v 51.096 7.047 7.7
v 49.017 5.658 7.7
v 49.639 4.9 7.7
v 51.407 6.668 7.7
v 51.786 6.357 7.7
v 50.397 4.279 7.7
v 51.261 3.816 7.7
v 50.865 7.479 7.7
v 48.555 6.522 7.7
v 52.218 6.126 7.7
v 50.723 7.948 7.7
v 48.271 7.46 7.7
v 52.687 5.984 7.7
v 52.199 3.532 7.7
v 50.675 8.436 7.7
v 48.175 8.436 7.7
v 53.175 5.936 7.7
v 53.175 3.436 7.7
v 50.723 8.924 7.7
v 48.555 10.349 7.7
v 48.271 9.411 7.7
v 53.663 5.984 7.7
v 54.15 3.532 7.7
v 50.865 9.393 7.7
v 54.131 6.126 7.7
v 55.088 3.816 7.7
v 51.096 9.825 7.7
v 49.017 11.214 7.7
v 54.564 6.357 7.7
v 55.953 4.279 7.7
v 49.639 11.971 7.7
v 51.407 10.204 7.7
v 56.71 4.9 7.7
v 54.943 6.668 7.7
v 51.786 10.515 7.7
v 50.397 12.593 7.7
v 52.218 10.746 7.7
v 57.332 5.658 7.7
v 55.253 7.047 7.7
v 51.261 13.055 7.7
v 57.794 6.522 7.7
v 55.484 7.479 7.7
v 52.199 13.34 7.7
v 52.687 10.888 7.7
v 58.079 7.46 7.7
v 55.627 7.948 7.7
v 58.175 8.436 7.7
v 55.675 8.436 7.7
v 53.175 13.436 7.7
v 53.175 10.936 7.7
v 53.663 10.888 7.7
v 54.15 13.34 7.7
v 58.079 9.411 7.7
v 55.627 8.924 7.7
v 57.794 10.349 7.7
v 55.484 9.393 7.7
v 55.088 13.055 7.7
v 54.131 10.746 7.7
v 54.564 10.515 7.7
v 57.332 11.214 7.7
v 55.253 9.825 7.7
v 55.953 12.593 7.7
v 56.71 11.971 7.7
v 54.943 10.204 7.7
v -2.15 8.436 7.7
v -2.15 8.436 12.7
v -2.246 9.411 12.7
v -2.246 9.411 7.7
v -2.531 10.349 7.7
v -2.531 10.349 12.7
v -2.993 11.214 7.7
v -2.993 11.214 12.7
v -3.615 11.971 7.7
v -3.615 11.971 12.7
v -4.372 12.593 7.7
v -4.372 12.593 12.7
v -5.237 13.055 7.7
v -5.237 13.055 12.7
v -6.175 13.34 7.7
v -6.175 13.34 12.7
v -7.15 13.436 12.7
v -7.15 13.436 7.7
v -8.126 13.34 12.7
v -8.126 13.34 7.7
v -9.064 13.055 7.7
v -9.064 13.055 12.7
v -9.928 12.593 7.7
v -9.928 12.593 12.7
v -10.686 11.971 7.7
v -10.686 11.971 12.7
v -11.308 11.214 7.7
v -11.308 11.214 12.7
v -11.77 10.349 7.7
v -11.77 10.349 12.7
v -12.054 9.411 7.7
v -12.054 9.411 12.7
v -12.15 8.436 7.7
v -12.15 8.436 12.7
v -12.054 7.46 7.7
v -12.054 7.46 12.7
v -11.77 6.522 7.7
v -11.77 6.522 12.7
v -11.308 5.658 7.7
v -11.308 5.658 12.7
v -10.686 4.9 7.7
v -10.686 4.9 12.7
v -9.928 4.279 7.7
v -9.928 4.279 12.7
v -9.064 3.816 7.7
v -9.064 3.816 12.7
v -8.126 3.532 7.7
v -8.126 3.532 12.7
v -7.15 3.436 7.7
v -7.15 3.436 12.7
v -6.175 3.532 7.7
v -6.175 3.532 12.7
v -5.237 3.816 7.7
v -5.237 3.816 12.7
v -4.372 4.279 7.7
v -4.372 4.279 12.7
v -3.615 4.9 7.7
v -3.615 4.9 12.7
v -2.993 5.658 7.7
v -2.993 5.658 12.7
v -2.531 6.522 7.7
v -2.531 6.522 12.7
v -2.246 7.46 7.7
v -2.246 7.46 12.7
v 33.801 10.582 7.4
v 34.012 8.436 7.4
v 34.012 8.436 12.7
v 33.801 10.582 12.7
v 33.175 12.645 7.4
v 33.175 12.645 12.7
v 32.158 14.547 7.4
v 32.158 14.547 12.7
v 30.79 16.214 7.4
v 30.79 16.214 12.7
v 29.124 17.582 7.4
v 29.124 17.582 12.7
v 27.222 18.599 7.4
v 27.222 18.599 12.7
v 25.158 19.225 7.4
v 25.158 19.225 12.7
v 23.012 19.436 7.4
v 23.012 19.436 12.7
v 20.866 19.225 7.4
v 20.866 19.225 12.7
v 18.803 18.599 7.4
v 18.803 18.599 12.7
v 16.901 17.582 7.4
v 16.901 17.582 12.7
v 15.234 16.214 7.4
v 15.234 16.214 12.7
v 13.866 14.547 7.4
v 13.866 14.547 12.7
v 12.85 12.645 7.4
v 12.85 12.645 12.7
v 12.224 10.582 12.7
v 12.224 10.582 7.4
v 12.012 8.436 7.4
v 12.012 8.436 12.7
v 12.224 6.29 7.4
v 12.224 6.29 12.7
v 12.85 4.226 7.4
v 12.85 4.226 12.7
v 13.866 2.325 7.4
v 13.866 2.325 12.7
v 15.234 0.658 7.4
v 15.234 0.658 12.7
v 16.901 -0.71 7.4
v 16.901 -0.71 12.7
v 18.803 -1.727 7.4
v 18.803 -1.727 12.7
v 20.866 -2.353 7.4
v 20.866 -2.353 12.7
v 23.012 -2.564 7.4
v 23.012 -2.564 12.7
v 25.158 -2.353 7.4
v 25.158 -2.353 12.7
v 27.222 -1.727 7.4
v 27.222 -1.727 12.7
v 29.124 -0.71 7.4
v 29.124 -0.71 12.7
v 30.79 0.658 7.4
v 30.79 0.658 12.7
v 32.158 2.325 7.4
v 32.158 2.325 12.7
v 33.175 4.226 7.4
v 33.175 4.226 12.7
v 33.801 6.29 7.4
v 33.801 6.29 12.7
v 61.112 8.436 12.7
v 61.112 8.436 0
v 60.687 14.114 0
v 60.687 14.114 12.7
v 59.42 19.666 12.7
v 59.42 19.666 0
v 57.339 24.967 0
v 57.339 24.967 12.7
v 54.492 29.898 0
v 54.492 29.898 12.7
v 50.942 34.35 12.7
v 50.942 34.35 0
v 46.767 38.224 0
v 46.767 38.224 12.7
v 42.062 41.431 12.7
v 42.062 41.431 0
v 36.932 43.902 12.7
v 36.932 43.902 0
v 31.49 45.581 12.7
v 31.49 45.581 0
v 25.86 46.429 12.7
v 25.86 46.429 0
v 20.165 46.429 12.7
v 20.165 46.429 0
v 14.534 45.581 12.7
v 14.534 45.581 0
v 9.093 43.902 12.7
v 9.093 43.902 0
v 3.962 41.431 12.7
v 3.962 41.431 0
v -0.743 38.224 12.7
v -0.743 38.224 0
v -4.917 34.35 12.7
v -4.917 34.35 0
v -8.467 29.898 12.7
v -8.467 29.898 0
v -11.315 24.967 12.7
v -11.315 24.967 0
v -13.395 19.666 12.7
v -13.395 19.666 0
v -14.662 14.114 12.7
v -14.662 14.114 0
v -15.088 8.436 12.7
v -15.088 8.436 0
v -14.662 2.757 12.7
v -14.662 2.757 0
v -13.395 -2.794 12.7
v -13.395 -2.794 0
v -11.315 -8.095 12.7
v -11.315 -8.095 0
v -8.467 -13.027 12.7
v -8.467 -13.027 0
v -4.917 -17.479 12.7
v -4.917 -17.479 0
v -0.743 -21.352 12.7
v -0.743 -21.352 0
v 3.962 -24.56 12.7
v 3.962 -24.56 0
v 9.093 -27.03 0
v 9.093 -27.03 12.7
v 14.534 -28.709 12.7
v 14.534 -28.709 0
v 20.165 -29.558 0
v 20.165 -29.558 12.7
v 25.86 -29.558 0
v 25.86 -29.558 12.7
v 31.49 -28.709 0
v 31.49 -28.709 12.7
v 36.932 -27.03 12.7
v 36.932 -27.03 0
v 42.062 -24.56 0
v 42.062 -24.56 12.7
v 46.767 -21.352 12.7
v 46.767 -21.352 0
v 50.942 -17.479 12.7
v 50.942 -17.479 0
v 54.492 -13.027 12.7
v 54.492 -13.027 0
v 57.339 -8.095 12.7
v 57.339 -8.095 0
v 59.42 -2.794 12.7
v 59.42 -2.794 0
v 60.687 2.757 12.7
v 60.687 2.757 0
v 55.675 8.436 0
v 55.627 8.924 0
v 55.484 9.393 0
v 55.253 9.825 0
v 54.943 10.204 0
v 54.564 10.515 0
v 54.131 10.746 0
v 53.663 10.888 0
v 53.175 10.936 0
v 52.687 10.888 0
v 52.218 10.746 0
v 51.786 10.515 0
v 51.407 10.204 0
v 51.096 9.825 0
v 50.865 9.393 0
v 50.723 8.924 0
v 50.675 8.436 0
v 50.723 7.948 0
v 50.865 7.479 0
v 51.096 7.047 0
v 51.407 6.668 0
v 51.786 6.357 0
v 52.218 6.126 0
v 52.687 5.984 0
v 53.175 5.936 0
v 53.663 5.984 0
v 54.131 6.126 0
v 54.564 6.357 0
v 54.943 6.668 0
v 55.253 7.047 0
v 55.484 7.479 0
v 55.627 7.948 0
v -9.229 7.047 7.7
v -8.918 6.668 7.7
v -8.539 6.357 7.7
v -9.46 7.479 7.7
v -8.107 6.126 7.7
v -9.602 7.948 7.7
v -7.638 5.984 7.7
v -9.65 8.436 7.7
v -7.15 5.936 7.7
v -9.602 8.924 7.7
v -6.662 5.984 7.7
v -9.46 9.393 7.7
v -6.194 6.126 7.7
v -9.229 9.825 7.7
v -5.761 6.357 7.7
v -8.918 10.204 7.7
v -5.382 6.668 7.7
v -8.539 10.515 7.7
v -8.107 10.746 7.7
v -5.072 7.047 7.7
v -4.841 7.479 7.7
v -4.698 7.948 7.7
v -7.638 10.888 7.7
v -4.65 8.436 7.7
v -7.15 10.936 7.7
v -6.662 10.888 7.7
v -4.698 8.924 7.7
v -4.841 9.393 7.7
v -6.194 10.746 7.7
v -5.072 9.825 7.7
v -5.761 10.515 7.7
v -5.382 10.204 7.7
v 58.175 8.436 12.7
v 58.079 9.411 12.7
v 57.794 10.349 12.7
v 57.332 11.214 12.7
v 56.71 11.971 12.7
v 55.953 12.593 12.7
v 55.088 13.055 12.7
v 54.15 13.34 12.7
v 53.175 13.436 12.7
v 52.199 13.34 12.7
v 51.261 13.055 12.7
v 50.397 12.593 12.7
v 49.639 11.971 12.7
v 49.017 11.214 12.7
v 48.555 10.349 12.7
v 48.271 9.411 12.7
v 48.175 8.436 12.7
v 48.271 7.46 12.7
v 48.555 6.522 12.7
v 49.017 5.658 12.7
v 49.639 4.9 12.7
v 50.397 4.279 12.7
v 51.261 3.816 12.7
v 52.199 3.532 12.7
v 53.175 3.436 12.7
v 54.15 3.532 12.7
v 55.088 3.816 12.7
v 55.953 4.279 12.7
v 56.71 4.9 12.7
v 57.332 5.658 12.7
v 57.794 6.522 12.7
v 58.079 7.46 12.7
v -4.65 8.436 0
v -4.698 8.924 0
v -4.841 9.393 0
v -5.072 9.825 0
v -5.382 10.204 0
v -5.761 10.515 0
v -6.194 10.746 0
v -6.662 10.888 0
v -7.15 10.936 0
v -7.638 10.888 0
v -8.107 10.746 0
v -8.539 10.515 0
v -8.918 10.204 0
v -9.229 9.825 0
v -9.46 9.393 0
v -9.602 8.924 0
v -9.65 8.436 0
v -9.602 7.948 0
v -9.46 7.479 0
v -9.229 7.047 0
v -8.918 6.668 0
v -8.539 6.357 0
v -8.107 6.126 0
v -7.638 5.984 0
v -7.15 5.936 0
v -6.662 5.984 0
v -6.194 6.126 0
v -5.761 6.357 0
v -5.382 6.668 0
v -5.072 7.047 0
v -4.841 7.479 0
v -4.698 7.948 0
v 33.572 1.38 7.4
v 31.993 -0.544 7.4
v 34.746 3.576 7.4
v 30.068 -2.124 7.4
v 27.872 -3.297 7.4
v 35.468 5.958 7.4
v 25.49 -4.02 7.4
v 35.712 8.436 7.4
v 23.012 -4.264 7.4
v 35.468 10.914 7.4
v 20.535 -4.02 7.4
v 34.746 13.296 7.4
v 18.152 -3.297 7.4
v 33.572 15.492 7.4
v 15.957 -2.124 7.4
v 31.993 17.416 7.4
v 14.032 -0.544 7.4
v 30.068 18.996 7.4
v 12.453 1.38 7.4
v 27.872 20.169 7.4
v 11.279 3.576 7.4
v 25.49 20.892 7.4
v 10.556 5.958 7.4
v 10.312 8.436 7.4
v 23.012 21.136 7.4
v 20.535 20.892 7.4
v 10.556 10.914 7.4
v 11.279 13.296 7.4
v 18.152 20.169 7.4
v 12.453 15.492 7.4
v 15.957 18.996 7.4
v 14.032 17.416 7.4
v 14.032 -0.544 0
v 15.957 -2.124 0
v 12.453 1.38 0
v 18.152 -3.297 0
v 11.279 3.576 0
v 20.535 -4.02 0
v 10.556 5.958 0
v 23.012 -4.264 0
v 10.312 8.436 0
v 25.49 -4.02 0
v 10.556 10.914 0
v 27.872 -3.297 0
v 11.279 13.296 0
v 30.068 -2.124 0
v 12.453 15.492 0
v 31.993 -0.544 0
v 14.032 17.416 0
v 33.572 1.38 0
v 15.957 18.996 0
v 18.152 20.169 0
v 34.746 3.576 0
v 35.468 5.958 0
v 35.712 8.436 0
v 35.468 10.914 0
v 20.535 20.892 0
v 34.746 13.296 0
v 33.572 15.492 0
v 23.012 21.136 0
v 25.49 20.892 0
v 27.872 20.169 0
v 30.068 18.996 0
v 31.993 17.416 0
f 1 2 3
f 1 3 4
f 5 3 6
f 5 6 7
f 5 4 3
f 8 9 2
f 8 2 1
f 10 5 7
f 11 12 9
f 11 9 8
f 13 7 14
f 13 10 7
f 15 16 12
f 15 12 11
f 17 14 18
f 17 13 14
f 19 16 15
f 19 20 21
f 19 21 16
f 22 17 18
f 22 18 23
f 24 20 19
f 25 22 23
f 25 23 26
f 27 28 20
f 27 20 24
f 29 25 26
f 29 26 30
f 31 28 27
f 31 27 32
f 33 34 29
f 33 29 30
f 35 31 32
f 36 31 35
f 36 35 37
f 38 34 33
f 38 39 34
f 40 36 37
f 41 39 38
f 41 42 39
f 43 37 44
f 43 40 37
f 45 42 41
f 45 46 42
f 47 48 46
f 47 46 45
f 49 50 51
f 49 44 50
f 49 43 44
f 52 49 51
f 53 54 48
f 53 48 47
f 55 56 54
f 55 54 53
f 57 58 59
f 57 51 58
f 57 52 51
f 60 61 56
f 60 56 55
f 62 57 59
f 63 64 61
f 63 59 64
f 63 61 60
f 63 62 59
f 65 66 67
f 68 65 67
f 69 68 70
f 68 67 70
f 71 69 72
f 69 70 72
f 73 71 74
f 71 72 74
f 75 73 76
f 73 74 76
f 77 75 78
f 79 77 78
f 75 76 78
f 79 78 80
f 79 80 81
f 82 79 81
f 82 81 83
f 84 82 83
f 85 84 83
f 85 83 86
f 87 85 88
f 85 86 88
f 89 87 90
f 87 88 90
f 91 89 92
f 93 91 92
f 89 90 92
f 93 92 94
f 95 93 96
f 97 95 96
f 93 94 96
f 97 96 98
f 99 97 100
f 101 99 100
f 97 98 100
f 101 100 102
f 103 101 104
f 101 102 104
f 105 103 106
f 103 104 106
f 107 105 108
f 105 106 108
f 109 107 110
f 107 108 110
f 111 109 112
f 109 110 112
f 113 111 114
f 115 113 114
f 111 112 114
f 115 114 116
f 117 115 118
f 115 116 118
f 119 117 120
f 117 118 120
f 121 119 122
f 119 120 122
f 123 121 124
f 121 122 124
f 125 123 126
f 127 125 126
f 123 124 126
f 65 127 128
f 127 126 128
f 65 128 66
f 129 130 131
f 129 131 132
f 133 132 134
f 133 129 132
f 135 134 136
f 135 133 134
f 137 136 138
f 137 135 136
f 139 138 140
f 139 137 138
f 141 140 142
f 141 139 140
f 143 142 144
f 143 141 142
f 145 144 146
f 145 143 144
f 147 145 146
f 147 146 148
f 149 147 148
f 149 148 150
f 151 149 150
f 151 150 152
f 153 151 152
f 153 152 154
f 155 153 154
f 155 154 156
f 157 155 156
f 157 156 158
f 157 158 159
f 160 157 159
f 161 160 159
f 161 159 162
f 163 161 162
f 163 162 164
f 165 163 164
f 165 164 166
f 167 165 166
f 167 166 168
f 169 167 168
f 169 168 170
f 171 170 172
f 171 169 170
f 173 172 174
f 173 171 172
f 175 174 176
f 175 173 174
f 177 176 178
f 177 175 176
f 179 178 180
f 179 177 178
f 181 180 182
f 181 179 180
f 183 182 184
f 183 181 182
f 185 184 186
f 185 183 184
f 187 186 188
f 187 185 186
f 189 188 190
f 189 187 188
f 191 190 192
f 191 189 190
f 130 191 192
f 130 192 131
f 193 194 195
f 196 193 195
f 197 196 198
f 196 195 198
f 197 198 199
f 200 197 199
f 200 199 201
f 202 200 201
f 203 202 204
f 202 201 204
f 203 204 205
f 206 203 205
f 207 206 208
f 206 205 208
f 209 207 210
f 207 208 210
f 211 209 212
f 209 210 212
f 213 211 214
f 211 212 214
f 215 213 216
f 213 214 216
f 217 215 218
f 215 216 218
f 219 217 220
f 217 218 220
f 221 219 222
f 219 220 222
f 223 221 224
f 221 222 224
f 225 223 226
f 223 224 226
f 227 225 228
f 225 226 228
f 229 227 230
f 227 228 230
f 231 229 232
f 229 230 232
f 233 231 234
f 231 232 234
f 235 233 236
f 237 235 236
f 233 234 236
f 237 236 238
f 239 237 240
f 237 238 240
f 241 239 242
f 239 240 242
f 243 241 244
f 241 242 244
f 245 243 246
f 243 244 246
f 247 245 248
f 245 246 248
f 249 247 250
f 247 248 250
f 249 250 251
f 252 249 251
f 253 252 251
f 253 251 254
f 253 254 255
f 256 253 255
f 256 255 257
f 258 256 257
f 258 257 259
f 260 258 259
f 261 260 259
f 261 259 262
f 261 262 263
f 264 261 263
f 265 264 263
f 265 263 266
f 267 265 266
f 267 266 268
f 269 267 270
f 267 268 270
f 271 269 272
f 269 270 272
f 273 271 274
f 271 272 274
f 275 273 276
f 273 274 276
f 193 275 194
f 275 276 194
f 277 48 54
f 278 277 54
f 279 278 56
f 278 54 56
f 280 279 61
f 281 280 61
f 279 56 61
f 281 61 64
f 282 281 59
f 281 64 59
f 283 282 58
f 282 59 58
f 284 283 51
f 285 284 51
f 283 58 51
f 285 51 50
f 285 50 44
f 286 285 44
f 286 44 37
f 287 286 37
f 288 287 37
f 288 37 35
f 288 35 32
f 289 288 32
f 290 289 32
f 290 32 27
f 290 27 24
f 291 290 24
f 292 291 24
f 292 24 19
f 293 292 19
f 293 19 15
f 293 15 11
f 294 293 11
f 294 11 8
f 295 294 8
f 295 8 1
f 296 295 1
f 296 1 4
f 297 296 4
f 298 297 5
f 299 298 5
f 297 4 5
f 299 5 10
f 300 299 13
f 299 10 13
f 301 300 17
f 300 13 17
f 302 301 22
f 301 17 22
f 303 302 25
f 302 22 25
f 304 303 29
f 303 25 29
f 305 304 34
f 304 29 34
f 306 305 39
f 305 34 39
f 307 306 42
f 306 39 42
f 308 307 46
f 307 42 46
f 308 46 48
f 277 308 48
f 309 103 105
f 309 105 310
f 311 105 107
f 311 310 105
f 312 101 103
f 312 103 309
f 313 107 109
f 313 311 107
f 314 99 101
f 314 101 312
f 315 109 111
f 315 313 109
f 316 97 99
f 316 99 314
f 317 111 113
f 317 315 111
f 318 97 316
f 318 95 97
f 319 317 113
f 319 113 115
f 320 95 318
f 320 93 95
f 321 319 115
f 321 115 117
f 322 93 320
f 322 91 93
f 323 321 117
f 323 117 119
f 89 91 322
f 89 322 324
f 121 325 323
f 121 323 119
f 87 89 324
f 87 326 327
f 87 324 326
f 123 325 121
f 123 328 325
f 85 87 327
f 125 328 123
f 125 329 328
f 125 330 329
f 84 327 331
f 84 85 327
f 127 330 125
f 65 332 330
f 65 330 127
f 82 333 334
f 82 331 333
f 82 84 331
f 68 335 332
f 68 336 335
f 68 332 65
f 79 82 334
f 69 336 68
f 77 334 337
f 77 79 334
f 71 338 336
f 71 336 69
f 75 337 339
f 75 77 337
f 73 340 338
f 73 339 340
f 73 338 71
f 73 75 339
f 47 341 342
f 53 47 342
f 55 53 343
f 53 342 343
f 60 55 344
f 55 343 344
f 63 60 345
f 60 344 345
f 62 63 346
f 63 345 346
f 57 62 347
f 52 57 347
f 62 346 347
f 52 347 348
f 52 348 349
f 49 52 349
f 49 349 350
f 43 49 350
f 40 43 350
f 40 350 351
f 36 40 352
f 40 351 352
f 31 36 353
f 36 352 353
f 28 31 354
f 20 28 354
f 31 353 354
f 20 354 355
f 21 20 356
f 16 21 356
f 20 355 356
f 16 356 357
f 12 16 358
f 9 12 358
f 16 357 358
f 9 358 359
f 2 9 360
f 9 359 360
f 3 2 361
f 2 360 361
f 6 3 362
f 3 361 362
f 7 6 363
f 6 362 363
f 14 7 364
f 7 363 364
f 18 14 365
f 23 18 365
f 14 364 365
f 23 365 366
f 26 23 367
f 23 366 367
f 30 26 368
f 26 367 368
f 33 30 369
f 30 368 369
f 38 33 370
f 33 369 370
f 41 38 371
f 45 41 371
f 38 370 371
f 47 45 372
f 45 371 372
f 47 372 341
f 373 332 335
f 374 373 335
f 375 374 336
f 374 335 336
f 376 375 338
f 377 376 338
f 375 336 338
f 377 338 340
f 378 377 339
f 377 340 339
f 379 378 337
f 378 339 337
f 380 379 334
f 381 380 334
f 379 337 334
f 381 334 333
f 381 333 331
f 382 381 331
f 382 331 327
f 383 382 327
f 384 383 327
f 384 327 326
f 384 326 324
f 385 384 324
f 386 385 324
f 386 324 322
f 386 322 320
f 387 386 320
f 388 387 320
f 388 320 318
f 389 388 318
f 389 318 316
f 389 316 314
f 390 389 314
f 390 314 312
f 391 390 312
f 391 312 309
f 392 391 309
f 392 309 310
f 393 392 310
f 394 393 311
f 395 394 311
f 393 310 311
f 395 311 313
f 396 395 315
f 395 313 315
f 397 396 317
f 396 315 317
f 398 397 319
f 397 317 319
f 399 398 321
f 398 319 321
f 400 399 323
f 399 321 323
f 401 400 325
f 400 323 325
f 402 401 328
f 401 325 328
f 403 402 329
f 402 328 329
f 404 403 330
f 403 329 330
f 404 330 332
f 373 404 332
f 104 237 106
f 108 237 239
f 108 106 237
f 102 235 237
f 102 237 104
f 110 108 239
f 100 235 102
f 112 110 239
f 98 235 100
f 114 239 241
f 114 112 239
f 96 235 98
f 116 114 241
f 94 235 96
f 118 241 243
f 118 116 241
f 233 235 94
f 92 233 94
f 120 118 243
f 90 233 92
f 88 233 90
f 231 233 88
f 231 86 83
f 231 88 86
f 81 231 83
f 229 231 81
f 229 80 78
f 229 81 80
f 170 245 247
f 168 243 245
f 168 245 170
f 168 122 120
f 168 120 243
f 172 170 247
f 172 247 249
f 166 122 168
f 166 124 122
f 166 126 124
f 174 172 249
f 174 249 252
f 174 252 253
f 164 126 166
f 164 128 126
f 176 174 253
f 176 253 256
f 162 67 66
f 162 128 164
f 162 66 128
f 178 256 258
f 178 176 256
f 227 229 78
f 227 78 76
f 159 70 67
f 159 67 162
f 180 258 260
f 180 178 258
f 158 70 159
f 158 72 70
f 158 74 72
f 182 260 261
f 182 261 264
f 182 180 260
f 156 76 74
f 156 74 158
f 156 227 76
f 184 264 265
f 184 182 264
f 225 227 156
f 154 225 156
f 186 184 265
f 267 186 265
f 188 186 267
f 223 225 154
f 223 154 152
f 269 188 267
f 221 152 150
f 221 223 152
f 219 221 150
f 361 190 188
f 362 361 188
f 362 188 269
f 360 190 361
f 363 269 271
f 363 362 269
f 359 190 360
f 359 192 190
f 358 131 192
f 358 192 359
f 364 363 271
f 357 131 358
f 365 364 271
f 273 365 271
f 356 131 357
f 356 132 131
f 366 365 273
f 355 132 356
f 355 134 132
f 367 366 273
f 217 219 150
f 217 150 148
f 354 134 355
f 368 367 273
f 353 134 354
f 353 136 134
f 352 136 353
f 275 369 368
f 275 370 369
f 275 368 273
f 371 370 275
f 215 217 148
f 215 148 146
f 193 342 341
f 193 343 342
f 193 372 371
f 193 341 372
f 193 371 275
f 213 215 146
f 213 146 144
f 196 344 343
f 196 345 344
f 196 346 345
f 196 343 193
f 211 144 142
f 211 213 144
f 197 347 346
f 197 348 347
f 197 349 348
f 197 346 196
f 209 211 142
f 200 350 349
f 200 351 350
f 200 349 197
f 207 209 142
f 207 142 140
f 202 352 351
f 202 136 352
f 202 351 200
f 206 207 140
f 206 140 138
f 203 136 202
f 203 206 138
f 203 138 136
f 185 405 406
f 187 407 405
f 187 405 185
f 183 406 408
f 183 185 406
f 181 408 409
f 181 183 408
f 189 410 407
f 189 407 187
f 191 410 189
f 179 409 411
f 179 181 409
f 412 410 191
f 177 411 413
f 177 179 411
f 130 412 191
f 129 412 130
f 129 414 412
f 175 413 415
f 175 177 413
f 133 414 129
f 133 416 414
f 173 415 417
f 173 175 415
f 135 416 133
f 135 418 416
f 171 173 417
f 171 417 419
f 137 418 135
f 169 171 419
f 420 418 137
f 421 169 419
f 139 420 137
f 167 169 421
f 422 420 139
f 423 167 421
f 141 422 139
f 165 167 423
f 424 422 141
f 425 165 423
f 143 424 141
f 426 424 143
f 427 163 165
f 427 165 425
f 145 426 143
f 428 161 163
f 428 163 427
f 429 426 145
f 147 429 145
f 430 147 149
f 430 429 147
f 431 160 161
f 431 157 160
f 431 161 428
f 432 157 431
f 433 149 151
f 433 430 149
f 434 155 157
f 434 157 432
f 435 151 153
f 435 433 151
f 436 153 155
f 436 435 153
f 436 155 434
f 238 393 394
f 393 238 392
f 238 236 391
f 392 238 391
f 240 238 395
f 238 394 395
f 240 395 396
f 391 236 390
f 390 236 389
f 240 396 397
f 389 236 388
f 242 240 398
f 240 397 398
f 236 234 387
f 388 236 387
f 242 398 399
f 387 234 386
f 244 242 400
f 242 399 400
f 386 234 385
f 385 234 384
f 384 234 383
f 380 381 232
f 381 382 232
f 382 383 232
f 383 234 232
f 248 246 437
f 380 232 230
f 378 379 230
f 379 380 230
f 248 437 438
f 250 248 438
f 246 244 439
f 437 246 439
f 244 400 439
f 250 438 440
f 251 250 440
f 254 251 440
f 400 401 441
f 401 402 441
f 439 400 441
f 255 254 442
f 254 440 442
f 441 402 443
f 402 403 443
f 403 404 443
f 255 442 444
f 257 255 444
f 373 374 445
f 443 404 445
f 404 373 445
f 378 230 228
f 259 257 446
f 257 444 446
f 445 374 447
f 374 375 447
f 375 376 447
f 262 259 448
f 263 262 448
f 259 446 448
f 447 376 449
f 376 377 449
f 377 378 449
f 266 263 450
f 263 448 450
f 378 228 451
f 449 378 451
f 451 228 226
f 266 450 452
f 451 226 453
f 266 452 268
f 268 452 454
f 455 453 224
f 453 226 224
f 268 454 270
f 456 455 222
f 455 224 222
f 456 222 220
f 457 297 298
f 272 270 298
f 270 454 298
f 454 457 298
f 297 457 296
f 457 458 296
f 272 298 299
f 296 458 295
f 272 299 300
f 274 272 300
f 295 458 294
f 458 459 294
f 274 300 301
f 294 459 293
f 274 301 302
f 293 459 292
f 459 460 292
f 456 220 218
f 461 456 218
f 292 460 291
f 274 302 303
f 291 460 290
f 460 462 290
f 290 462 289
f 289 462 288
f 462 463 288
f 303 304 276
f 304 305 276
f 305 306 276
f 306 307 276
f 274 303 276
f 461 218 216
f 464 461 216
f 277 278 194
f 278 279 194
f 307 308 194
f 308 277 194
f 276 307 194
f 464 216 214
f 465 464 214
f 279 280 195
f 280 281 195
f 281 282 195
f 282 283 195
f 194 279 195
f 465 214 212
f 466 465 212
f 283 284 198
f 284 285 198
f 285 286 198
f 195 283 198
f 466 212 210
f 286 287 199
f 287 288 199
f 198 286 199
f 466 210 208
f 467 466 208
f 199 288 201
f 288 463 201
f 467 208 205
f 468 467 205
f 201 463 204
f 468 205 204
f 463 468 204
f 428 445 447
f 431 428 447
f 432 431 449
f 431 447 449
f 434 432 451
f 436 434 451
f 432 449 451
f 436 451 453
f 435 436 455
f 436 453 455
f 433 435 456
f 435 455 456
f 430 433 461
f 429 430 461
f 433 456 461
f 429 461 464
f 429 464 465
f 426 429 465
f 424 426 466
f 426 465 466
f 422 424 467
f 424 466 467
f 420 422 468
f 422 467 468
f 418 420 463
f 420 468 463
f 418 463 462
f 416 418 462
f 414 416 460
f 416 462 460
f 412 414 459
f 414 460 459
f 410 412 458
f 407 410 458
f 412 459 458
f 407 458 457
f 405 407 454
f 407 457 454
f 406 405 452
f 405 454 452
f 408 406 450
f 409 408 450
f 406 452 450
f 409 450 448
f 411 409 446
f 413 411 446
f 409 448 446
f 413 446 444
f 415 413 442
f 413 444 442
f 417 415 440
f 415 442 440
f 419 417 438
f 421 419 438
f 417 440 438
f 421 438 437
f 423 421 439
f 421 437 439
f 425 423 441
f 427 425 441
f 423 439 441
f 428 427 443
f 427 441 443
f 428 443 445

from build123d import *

# Parameters (mm, degrees)
ESQUISSE1_R             = 38.1
ESQUISSE1_R_2           = 11
BOSS_EXTRU_1_DEPTH      = 12.7
ESQUISSE2_R             = 12.7
ENL_V_MAT_EXTRU_1_DEPTH = 7.4
ESQUISSE3_R             = 2.5
ENL_V_MAT_EXTRU_2_DEPTH = 13.7
ESQUISSE4_R             = 5
ENL_V_MAT_EXTRU_3_DEPTH = 5


with BuildPart() as part:
    # Esquisse1 → Boss.-Extru.1 (new body)
    with BuildSketch(Plane.XY):
        with Locations((23.012291104, 8.435887891)):
            Circle(ESQUISSE1_R)
        with Locations((23.012291104, 8.435887891)):
            Circle(ESQUISSE1_R_2, mode=Mode.SUBTRACT)
    extrude(amount=BOSS_EXTRU_1_DEPTH)

    # Esquisse2 → Enlèv. mat.-Extru.1 (cut)
    with BuildSketch(Plane(origin=(0, 0, 0), x_dir=(-1, 0, 0), z_dir=(0, 0, -1))):
        with Locations((-23.012291104, 8.435887891)):
            Circle(ESQUISSE2_R)
    extrude(amount=-ENL_V_MAT_EXTRU_1_DEPTH, mode=Mode.SUBTRACT)

    # Esquisse3 → Enlèv. mat.-Extru.2 (cut, through all)
    with BuildSketch(Plane.XY.offset(12.7)):
        with Locations((53.174791104, 8.435887891)):
            Circle(ESQUISSE3_R)
        with Locations((-7.150208896, 8.435887891)):
            Circle(ESQUISSE3_R)
    extrude(amount=-ENL_V_MAT_EXTRU_2_DEPTH, mode=Mode.SUBTRACT)

    # Esquisse4 → Enlèv. mat.-Extru.3 (cut)
    with BuildSketch(Plane.XY.offset(12.7)):
        with Locations((-7.150208896, 8.435887891)):
            Circle(ESQUISSE4_R)
        with Locations((53.174791104, 8.435887891)):
            Circle(ESQUISSE4_R)
    extrude(amount=-ENL_V_MAT_EXTRU_3_DEPTH, mode=Mode.SUBTRACT)


solid = part.part
